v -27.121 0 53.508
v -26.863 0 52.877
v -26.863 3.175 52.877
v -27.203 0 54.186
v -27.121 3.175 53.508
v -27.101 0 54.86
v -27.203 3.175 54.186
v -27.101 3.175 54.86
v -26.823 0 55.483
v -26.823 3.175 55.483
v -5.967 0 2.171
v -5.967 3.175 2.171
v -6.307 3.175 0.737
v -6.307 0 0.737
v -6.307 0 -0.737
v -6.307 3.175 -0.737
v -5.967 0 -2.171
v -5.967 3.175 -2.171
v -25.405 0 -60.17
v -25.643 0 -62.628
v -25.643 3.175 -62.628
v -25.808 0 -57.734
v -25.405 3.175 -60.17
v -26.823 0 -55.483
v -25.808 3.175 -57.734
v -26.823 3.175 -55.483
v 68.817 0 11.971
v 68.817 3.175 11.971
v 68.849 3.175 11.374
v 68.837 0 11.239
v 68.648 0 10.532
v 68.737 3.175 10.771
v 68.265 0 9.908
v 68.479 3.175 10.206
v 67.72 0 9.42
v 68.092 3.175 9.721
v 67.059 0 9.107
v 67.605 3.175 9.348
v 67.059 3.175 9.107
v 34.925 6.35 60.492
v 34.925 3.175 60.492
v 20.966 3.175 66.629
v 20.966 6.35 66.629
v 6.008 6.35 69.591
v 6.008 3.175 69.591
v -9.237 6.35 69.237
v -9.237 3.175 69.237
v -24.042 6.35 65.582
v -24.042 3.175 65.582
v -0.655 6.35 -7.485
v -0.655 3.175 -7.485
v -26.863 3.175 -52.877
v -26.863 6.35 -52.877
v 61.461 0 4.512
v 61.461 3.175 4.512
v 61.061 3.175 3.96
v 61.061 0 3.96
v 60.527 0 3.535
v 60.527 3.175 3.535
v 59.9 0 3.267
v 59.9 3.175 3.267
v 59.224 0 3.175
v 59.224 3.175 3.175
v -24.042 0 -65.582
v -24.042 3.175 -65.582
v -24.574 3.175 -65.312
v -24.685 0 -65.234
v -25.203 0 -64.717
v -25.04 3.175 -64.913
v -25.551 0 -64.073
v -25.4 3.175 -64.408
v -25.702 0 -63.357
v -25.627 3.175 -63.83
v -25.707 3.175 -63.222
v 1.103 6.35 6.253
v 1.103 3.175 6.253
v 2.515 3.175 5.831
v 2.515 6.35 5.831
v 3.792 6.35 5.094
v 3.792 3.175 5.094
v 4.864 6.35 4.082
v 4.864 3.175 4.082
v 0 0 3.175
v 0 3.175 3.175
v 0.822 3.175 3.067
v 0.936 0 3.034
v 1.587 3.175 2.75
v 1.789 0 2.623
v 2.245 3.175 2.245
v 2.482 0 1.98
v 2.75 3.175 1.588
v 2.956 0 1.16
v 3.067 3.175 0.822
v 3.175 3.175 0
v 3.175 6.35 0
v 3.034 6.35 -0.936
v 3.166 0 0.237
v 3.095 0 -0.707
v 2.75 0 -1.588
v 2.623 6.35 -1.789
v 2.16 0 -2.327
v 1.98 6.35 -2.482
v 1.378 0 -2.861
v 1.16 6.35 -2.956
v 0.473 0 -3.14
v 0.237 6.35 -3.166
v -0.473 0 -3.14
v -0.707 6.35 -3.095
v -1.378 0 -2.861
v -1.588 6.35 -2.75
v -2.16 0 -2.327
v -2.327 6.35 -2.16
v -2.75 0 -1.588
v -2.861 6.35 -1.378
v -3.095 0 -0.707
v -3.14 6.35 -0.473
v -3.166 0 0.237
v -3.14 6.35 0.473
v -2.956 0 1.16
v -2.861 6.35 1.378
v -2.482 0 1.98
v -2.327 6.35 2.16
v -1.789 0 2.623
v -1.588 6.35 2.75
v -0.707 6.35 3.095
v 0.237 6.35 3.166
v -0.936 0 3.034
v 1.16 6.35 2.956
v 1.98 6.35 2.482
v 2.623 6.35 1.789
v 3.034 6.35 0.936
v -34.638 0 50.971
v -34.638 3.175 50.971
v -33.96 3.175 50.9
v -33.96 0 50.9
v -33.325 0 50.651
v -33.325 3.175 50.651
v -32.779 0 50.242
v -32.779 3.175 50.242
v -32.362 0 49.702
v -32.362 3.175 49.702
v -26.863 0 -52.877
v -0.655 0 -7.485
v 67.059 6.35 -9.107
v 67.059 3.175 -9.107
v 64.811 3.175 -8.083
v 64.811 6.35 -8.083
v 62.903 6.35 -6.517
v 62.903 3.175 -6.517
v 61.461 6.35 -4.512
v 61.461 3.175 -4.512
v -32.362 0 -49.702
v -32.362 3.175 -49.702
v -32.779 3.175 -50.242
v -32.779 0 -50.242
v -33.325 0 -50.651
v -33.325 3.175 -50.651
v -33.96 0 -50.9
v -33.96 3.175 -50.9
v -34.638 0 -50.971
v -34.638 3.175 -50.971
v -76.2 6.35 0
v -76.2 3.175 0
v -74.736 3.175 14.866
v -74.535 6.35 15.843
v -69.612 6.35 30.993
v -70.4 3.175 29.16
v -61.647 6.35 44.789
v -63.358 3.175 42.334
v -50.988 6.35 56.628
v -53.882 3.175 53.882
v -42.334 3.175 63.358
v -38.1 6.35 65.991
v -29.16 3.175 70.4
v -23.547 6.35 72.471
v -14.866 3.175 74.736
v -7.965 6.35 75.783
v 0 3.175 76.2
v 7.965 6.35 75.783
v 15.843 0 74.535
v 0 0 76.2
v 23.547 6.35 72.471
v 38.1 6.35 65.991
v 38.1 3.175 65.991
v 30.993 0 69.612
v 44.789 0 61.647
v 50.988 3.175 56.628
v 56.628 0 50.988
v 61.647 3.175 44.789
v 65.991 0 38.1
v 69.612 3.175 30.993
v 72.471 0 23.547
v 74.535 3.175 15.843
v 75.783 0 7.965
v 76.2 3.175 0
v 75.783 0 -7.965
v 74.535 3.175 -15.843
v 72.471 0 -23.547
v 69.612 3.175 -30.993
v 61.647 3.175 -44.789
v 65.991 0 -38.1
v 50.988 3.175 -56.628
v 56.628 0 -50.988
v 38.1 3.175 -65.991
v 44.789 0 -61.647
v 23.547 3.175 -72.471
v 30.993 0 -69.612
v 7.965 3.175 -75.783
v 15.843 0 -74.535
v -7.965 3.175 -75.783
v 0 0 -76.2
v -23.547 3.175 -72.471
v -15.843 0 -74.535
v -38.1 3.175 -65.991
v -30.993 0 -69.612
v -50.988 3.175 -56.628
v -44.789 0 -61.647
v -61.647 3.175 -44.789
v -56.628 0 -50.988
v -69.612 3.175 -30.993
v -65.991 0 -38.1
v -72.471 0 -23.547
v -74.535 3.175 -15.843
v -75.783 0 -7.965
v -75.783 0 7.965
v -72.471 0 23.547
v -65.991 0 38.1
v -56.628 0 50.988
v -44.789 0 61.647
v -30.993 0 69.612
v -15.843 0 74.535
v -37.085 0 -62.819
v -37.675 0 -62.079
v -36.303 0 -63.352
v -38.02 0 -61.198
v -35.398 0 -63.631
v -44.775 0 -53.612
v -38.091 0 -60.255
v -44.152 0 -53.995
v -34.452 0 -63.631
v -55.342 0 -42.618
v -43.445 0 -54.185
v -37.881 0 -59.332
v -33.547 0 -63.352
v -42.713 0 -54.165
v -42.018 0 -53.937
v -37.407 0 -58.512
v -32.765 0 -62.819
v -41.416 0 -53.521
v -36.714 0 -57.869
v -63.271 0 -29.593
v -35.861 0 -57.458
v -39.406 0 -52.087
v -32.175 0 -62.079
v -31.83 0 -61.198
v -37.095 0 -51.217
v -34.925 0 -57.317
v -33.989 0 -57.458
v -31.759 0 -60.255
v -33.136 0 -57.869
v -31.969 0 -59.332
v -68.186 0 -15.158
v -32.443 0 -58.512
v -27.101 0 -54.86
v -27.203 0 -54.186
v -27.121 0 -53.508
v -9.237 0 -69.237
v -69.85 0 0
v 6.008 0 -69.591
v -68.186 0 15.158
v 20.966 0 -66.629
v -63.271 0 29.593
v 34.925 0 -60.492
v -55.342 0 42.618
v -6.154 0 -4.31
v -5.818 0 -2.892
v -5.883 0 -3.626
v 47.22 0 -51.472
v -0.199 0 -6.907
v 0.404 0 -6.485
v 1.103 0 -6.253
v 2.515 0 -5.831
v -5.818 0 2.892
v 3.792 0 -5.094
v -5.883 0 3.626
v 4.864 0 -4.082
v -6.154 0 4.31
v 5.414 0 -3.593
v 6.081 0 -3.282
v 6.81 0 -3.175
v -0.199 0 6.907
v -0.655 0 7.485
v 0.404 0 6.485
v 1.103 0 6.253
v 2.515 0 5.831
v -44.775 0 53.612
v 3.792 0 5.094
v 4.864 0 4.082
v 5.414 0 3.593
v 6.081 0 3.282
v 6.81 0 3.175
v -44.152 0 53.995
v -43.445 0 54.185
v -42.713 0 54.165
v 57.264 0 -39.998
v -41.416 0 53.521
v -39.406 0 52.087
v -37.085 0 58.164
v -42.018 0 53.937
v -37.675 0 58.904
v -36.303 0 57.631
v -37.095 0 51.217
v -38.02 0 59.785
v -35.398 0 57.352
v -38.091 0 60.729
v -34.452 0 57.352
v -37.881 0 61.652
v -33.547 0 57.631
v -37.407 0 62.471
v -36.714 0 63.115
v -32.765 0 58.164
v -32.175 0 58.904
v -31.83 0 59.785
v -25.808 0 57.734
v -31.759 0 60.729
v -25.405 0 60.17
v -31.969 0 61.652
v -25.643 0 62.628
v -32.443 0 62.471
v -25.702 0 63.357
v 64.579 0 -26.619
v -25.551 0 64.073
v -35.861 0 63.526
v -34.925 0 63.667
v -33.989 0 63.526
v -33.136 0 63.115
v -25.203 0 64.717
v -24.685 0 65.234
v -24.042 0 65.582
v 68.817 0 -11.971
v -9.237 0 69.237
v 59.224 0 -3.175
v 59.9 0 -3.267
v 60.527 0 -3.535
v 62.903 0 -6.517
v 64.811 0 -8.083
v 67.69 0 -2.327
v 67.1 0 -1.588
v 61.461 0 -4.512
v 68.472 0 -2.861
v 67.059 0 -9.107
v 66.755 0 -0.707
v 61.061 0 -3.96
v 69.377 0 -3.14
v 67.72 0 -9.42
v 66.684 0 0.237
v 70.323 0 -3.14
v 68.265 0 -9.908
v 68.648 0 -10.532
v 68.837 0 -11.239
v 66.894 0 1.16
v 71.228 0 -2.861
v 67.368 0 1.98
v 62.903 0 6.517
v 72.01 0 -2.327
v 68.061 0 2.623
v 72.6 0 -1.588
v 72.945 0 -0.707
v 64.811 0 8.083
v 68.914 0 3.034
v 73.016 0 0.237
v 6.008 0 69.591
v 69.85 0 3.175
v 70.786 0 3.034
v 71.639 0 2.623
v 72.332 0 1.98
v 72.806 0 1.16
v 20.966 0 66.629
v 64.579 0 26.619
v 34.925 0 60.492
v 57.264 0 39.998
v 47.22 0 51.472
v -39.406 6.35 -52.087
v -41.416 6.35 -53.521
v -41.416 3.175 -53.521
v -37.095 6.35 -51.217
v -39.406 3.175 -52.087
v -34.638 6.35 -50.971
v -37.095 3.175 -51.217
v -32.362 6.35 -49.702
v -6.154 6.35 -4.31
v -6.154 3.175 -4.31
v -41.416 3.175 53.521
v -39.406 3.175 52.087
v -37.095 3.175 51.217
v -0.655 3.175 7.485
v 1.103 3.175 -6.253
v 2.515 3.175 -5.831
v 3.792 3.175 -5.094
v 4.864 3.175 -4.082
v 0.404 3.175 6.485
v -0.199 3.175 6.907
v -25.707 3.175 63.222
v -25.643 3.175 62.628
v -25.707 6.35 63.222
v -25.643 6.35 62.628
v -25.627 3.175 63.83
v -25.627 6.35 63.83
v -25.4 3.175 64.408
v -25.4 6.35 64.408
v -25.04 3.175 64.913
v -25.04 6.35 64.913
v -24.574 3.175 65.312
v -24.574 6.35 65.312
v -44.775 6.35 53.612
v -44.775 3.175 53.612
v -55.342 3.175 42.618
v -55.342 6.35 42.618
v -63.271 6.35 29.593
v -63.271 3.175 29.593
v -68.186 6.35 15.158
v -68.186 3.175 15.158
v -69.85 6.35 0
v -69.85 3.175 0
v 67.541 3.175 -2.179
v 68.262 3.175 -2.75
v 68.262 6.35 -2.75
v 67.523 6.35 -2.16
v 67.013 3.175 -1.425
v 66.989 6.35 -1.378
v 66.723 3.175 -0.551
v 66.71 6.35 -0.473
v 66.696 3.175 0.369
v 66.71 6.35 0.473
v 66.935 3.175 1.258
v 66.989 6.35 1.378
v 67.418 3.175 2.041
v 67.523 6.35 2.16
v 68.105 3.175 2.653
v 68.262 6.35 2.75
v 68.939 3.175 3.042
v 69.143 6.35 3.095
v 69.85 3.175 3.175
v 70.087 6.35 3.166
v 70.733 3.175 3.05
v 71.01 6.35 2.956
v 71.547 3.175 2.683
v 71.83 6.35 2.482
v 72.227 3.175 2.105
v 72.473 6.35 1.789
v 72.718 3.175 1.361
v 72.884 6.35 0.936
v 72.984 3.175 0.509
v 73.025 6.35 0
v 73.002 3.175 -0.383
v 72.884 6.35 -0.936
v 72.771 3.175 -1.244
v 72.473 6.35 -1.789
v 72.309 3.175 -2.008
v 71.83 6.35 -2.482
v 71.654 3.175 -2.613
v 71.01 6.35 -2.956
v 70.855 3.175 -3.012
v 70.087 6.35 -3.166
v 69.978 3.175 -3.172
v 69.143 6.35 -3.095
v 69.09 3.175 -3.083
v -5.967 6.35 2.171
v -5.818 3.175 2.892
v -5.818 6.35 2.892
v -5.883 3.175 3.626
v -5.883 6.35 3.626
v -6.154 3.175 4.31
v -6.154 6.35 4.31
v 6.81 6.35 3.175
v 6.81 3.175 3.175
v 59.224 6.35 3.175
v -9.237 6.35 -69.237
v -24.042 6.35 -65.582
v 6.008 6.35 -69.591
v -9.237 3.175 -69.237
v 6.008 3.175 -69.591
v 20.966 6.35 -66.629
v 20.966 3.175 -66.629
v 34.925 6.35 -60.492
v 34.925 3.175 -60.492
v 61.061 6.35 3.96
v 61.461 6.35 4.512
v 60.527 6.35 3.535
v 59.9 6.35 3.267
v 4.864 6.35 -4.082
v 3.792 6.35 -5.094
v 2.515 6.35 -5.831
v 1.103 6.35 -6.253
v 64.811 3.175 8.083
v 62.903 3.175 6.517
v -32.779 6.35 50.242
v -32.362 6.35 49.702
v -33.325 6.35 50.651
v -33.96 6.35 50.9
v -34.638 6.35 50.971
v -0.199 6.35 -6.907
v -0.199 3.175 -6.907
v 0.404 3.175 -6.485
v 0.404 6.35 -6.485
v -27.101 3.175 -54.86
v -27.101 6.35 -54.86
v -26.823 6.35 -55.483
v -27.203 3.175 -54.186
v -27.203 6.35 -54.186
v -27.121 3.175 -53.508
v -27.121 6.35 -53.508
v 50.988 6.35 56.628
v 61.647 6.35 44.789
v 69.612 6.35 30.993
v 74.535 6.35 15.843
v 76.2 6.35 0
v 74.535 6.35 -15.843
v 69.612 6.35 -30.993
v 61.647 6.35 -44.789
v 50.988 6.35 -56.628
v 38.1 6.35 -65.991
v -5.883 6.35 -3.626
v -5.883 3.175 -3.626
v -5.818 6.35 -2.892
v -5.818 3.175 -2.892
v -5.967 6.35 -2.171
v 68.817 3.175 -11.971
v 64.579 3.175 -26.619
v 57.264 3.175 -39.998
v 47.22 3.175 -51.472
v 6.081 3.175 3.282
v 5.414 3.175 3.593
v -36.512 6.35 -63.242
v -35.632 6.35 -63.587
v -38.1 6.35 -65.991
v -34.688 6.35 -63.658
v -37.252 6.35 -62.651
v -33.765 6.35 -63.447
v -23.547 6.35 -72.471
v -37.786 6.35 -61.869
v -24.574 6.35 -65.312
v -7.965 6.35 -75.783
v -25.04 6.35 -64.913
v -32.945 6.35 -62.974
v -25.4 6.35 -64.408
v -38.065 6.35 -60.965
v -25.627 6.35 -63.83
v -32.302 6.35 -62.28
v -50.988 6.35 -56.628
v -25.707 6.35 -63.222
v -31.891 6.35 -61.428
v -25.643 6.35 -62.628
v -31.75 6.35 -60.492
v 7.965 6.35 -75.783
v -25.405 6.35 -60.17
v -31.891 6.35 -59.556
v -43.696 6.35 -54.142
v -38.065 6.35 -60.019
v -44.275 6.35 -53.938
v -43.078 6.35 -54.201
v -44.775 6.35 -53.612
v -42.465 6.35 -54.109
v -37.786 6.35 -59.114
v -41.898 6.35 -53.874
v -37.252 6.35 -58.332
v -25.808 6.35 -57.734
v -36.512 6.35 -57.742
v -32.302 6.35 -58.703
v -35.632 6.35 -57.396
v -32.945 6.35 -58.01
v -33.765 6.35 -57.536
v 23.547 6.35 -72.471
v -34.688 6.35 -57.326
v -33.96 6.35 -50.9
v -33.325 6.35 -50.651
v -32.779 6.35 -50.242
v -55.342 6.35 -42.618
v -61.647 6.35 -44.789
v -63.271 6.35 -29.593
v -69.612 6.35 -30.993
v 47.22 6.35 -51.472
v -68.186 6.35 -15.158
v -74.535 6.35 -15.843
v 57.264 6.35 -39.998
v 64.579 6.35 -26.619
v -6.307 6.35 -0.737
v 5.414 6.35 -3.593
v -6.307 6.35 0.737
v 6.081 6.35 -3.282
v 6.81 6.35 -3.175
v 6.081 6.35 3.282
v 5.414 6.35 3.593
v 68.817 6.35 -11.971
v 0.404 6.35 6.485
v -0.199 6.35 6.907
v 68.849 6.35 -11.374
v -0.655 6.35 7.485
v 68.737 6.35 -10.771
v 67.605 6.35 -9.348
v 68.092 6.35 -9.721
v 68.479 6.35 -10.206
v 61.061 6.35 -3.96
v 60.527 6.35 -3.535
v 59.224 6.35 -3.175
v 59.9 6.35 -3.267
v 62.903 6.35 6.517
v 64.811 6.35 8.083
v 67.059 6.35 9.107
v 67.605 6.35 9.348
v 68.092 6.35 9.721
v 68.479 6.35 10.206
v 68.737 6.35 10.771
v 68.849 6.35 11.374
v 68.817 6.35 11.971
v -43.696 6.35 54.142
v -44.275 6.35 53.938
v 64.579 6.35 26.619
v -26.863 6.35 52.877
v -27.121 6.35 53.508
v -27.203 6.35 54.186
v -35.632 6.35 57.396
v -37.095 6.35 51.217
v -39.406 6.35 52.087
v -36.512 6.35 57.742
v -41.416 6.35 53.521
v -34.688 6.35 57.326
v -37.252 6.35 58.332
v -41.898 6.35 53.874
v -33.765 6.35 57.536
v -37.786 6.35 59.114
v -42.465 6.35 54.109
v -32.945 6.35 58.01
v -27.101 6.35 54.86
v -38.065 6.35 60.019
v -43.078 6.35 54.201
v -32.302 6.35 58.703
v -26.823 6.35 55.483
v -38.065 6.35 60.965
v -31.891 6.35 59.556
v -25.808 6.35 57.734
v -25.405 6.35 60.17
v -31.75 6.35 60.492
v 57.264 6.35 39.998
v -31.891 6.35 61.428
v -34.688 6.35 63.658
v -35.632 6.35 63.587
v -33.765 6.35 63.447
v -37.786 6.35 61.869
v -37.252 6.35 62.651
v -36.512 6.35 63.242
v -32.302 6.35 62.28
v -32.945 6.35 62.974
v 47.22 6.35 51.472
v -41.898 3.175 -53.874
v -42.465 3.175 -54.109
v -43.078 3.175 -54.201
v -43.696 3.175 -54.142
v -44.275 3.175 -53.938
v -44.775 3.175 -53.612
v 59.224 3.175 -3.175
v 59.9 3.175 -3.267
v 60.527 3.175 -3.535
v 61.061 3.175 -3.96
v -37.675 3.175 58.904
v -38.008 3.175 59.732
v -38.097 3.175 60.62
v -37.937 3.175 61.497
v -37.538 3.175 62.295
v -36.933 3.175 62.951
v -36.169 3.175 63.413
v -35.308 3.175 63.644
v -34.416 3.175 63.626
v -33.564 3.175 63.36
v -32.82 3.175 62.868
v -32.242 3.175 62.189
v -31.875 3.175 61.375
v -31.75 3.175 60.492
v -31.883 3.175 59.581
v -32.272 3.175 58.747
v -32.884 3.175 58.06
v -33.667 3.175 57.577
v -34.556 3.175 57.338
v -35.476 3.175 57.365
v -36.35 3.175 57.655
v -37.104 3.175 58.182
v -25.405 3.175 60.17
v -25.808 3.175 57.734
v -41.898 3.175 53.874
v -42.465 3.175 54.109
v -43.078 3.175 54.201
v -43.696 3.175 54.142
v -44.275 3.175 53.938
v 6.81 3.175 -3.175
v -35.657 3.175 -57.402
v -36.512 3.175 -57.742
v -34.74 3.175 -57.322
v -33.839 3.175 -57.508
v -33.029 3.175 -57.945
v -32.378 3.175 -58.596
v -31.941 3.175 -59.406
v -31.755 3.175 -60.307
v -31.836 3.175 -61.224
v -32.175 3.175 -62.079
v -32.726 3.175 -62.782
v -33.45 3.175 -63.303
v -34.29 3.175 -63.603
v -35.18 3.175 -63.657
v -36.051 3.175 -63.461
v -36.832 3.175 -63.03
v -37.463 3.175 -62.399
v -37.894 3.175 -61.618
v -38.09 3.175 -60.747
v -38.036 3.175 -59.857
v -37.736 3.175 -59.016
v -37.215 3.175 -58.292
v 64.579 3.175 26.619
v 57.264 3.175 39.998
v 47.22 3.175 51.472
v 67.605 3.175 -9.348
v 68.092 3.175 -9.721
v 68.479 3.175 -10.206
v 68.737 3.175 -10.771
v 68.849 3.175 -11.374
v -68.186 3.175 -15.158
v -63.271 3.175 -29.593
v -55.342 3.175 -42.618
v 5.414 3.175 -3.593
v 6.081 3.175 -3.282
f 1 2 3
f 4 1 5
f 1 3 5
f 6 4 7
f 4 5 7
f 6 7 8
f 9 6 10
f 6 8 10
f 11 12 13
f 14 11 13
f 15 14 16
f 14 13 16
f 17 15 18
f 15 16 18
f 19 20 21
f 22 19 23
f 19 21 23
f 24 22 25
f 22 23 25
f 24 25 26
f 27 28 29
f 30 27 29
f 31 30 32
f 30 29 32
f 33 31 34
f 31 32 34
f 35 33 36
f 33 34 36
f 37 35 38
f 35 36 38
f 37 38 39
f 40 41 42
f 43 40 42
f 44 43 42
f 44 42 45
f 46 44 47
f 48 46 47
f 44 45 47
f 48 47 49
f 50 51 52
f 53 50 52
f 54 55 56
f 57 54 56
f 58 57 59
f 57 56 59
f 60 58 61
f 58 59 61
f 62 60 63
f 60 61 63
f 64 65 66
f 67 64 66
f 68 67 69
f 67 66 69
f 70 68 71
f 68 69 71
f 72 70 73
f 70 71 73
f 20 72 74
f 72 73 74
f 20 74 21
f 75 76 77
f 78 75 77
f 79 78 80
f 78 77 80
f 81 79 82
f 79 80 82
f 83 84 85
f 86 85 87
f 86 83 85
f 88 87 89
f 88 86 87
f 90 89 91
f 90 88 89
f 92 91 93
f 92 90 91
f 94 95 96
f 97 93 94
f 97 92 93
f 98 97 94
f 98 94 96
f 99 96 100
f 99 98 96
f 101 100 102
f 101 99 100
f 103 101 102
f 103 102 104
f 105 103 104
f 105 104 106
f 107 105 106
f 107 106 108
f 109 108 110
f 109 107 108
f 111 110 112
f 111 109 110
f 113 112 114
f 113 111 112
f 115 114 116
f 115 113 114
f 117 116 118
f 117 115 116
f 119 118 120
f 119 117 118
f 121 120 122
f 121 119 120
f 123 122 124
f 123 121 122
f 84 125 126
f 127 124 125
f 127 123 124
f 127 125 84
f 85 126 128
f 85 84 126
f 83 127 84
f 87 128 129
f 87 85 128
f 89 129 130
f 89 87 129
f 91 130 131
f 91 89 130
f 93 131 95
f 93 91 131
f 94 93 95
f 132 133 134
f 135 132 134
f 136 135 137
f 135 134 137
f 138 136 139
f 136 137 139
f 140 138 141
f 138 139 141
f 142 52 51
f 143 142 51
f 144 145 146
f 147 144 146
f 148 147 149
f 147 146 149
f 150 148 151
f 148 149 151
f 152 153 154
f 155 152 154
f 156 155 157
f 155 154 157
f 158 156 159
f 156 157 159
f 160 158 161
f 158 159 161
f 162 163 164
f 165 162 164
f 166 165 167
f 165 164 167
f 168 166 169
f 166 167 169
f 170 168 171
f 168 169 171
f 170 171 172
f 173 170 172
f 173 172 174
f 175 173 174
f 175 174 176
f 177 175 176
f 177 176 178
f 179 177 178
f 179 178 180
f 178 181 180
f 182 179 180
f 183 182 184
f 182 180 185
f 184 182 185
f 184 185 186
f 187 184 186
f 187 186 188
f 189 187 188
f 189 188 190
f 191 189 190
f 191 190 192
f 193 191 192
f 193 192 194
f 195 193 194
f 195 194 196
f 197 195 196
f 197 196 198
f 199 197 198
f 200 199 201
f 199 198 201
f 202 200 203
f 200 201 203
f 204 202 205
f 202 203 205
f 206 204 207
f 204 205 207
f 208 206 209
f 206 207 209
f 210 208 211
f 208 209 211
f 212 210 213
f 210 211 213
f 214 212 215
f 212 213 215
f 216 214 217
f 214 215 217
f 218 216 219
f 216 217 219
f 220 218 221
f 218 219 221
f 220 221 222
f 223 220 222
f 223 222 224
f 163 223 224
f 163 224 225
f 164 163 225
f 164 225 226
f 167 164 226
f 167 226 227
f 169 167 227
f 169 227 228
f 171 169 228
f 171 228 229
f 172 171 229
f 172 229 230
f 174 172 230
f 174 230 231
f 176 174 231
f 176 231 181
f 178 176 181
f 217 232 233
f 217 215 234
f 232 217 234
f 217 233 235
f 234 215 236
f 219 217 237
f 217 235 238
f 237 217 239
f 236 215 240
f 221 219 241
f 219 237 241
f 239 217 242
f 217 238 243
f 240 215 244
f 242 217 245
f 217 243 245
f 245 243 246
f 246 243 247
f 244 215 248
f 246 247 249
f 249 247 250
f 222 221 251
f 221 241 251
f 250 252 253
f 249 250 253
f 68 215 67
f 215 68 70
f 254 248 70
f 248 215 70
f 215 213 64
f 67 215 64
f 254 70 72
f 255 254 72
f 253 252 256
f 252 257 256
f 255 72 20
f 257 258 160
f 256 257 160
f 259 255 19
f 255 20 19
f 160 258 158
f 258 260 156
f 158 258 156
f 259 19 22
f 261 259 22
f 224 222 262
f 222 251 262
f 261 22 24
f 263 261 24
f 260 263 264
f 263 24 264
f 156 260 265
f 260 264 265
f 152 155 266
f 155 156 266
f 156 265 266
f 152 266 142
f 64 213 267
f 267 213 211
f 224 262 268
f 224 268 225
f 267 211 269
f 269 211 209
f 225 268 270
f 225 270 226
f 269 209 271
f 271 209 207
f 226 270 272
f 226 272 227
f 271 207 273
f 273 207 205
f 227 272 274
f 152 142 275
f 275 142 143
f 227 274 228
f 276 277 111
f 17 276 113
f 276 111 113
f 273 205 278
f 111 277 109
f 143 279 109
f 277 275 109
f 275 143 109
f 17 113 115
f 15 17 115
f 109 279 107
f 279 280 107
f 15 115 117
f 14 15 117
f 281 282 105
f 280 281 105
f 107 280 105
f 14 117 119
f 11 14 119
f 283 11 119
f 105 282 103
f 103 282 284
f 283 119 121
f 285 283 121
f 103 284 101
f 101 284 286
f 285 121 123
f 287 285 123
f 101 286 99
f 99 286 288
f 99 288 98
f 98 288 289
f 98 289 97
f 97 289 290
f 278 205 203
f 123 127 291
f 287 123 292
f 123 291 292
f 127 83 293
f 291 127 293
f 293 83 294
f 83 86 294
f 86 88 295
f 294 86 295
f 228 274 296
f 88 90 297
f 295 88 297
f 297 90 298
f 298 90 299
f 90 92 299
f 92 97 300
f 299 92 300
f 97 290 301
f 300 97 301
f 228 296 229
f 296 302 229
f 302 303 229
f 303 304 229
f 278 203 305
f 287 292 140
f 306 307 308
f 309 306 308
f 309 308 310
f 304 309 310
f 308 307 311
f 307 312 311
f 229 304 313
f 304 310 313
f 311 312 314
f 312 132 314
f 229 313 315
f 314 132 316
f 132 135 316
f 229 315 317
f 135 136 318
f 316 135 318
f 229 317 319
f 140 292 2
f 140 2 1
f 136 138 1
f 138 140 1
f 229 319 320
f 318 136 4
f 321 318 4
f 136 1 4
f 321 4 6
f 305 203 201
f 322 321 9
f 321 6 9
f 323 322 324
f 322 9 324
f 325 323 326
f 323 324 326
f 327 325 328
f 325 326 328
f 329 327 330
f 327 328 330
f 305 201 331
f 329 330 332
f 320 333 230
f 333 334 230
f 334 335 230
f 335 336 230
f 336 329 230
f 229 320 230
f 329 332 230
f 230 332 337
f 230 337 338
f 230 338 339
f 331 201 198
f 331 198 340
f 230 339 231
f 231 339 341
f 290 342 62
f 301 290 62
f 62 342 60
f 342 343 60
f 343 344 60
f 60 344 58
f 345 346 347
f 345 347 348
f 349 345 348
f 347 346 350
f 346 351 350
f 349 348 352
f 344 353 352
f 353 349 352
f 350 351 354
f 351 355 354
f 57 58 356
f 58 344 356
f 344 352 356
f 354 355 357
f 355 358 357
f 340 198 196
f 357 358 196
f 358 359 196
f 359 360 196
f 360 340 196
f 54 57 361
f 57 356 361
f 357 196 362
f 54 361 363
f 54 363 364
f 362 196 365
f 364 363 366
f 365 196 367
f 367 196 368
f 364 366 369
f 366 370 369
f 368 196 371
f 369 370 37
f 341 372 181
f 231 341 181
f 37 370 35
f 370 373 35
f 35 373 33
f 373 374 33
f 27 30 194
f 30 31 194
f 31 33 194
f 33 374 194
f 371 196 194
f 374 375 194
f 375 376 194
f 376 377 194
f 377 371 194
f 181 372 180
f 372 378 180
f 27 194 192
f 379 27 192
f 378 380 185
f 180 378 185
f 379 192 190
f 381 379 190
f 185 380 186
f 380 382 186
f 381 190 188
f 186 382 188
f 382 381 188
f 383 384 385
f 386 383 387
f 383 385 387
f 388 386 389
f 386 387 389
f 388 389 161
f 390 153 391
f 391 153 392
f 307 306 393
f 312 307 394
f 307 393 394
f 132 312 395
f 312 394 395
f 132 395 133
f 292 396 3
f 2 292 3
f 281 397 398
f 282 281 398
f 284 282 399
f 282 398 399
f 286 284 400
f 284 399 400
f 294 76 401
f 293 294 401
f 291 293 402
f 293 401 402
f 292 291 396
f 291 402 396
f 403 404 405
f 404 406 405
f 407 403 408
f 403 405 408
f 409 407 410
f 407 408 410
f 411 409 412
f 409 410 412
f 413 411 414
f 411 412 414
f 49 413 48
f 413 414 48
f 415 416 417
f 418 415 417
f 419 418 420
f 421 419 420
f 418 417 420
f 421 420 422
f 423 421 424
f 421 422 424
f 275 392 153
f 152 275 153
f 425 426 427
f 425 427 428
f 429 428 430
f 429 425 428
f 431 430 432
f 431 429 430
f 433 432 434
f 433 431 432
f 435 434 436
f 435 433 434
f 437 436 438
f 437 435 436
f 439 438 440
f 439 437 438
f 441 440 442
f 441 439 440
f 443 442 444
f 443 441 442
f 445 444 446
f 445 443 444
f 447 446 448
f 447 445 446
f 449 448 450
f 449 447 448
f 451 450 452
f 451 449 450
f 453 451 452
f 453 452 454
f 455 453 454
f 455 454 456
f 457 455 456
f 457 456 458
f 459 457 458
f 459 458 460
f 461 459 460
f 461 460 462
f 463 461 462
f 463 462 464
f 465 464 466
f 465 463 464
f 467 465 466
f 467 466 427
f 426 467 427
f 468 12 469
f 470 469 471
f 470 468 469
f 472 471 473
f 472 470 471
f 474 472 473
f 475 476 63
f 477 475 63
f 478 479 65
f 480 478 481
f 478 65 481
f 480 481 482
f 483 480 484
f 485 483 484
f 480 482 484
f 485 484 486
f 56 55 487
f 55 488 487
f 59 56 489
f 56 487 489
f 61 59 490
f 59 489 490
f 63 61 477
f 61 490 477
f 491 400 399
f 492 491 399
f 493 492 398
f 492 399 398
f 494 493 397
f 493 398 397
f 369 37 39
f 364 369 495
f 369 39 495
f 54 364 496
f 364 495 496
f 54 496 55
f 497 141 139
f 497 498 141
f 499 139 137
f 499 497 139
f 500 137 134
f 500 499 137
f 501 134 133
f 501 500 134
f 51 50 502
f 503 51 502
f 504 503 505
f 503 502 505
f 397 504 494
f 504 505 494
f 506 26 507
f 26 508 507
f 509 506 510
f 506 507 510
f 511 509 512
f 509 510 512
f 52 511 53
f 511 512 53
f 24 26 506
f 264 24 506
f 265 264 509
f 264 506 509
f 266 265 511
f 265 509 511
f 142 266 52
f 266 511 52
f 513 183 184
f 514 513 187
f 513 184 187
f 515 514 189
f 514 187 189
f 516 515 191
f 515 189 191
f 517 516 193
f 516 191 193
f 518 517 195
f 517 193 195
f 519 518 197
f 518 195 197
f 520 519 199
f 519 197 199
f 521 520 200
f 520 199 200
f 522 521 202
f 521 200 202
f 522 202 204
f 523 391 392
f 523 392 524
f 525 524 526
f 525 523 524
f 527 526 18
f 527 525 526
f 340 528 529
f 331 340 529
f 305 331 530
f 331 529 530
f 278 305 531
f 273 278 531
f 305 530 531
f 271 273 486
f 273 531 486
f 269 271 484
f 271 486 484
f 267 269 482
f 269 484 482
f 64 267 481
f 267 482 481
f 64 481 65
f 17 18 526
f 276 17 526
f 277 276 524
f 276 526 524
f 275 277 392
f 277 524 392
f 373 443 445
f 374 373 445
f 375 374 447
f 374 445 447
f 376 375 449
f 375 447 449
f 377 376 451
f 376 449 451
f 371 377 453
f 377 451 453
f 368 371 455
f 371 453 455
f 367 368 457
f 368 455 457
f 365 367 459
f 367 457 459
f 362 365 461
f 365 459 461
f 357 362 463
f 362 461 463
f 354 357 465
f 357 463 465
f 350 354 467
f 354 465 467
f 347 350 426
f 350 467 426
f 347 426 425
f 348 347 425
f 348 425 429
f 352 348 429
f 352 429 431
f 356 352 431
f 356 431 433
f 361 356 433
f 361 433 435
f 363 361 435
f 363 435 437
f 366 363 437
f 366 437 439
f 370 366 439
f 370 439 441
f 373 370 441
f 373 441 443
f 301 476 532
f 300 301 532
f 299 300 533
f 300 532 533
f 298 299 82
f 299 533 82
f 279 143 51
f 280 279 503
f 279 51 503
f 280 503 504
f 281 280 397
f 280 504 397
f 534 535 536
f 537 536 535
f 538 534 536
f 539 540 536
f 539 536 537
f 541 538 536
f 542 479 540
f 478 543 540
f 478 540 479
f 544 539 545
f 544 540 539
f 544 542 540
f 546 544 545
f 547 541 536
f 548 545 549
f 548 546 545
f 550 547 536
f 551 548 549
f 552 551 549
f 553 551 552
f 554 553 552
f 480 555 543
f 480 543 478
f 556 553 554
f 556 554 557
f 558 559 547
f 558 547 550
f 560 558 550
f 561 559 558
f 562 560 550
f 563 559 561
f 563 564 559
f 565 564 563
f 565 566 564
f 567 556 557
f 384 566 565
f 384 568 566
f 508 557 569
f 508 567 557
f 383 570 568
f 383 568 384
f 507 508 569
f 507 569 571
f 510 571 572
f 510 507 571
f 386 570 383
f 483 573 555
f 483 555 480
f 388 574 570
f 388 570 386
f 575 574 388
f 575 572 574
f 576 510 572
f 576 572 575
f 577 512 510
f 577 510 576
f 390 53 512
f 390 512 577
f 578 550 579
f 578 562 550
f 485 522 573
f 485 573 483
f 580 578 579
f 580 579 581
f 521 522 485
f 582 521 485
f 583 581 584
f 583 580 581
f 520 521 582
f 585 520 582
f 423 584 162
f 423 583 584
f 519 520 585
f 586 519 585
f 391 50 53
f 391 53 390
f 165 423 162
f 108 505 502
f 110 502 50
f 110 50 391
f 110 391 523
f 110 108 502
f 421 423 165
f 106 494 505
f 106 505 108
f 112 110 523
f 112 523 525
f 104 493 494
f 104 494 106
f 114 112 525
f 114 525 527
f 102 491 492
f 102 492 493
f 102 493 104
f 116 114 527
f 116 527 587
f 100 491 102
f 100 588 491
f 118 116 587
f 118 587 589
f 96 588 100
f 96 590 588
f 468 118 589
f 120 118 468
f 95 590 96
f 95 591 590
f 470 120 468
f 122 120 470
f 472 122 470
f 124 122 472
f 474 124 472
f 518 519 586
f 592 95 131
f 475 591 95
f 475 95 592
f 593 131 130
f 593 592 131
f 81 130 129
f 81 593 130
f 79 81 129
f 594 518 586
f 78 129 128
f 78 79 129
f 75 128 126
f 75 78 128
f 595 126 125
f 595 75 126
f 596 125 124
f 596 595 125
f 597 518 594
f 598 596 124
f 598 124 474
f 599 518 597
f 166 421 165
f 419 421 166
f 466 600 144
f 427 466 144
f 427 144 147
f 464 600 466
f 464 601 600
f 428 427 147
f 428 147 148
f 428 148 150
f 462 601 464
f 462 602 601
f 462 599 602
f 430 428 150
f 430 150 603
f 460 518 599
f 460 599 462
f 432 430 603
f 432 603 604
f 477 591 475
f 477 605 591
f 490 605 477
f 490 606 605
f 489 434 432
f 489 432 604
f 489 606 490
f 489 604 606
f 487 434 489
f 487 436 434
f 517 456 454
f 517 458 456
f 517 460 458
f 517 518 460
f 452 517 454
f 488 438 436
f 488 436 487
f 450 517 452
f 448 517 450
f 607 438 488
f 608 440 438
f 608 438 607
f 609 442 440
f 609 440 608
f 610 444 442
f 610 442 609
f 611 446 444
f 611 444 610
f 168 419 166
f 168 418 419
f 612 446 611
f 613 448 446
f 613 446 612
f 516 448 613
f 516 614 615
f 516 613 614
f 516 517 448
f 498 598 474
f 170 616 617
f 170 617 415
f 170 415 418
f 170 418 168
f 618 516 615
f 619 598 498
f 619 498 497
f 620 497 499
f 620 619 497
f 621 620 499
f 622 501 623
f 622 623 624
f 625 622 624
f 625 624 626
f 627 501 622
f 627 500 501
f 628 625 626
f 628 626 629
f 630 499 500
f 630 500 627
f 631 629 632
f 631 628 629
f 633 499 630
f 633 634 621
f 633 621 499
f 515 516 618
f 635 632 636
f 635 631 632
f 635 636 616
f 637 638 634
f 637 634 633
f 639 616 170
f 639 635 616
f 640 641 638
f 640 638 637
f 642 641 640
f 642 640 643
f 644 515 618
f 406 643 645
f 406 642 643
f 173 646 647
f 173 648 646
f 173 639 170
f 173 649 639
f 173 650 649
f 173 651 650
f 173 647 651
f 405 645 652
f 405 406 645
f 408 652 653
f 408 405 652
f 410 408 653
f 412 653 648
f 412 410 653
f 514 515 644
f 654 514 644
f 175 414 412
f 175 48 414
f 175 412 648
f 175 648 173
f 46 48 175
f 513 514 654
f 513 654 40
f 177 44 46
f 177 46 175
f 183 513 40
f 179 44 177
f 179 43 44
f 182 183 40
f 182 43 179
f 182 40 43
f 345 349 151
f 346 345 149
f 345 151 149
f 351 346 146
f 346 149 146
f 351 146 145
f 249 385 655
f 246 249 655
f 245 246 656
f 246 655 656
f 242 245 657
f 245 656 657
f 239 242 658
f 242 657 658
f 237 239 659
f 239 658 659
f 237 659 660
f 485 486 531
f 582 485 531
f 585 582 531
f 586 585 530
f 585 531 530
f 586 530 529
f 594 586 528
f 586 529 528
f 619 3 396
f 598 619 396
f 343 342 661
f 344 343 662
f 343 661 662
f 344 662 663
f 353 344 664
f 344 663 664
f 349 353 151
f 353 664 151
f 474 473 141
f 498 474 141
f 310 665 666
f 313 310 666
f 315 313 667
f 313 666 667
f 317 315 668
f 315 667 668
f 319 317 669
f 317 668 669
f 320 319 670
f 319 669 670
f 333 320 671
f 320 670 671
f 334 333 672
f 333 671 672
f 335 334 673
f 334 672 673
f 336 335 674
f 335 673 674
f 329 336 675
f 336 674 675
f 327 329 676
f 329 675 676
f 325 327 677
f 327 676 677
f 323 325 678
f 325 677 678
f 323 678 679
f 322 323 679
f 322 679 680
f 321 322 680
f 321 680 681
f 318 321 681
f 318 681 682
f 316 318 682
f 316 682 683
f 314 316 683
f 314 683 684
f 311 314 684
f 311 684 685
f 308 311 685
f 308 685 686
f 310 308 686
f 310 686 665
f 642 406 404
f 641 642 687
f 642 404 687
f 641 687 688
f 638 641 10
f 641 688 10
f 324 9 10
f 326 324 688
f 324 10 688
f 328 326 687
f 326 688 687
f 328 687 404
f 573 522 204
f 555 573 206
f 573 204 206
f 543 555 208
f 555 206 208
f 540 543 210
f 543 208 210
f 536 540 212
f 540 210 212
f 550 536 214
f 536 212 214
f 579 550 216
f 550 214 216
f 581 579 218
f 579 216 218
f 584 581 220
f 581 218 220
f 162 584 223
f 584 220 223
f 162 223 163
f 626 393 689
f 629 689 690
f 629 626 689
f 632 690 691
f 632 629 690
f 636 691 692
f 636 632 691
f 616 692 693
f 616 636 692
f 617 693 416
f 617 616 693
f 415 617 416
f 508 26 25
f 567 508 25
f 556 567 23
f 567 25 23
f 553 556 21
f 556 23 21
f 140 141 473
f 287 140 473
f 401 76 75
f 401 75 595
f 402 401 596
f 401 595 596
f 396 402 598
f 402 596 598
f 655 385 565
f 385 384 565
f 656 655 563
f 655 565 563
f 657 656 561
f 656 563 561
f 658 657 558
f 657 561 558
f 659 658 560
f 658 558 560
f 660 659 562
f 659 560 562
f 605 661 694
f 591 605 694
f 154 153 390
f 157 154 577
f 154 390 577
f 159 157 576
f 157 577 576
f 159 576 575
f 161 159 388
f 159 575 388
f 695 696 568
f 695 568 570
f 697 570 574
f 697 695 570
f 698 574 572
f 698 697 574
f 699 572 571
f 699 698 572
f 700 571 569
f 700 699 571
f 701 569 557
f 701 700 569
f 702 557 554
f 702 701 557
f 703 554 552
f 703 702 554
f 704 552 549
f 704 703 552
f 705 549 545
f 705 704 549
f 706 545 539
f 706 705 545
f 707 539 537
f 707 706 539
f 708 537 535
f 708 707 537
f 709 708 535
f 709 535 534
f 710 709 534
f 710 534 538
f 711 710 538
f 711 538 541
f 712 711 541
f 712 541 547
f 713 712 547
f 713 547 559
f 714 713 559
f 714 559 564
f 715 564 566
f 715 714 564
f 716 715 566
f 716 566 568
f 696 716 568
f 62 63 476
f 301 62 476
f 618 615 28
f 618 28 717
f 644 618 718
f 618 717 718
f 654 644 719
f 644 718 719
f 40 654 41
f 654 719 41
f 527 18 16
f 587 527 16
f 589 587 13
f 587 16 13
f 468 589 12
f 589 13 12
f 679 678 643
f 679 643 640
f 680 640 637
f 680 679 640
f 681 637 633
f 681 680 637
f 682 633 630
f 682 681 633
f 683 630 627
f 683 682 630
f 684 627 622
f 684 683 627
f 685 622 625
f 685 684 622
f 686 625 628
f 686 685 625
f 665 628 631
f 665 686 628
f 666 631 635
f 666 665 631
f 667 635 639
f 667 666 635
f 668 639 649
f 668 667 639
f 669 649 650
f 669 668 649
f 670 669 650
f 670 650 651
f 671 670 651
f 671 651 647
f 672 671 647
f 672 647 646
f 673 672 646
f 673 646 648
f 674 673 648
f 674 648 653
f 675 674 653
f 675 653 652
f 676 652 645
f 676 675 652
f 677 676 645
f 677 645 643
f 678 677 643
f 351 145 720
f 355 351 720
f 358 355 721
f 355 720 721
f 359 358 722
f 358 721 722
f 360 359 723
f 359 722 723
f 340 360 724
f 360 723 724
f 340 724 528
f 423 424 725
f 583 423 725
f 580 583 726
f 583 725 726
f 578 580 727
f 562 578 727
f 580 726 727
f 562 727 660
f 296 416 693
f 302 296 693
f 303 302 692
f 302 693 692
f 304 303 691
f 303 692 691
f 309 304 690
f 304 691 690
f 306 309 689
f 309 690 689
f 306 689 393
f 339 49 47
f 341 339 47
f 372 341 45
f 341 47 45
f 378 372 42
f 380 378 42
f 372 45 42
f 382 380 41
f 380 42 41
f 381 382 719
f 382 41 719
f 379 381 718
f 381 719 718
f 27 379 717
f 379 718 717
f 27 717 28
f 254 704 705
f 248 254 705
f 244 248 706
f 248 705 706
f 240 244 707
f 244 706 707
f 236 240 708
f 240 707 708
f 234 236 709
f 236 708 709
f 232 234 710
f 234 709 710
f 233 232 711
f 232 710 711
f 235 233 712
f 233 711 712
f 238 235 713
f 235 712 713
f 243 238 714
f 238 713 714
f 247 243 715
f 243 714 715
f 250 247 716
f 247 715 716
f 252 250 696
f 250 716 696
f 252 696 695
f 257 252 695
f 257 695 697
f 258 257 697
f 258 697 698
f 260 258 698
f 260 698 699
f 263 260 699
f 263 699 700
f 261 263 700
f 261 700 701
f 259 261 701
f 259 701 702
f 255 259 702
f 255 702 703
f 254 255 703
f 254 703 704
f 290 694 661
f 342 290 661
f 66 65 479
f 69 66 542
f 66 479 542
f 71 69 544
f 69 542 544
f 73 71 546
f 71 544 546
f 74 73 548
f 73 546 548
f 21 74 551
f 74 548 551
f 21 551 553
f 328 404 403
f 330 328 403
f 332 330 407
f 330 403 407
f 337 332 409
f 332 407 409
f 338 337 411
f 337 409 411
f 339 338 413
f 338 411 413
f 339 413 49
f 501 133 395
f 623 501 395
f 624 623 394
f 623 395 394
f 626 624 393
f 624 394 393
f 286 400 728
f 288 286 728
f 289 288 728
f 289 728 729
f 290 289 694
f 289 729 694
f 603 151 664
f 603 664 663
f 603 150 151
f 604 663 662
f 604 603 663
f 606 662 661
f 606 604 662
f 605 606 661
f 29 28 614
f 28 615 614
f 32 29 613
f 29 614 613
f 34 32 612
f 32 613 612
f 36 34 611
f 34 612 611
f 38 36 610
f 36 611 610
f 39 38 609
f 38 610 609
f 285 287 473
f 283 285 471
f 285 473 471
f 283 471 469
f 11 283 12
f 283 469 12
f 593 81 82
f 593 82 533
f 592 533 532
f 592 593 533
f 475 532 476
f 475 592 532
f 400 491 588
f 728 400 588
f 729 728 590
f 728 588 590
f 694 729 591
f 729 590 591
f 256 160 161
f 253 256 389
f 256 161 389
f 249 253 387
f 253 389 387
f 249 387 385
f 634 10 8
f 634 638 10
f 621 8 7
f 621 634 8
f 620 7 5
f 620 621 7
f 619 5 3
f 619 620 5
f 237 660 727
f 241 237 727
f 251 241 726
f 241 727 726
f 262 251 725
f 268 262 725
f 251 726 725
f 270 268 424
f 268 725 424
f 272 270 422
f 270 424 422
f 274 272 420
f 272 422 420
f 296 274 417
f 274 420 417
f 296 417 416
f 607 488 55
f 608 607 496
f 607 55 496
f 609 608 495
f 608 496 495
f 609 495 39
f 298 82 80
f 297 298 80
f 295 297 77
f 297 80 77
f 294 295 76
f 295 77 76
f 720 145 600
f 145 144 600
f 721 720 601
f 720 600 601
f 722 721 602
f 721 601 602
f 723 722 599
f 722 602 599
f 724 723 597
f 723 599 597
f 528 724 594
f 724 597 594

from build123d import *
from build123d.topology import SkipClean

# Parameters (mm, degrees)
SKETCH1_R           = 76.2
SKETCH1_R_2         = 3.175
BOSS_EXTRUDE1_DEPTH = 3.175
SKETCH2_R           = 3.175
CUT_EXTRUDE1_DEPTH  = 108.809835474
CIRPATTERN1_COUNT   = 3
SKETCH3_R           = 3.175
BOSS_EXTRUDE2_DEPTH = 3.175
CIRPATTERN2_COUNT   = 3
FILLET1_R           = 2.54
CUT_EXTRUDE2_DEPTH  = 108.809835619
CIRPATTERN3_COUNT   = 3


with BuildPart() as part:
    # Sketch1 → Boss-Extrude1 (new body)
    with BuildSketch(Plane(origin=(0, 0, 0), x_dir=(1, 0, 0), z_dir=(0, 1, 0))):
        with Locations(Location((0, 0, 0), (0, 0, 270))):
            Circle(SKETCH1_R)
        with Locations(Location((0, 0, 0), (0, 0, 270))):
            Circle(SKETCH1_R_2, mode=Mode.SUBTRACT)
    extrude(amount=BOSS_EXTRUDE1_DEPTH)

    # Sketch2 → Cut-Extrude1 (cut, through all)
    with BuildSketch(Plane(origin=(0, 3.175, 0), x_dir=(1, 0, 0), z_dir=(0, 1, 0))):
        with Locations(Location((69.85, 0, 0), (0, 0, 270))):
            Circle(SKETCH2_R)
    cut_extrude1 = extrude(amount=-CUT_EXTRUDE1_DEPTH, mode=Mode.SUBTRACT)

    # CirPattern1: Cut-Extrude1 ×3 about axis
    cirpattern1_axis = Axis((0, 0, 0), (0, 1, 0))
    for i in range(1, CIRPATTERN1_COUNT):
        add(cut_extrude1.rotate(cirpattern1_axis, i * 360 / CIRPATTERN1_COUNT), mode=Mode.SUBTRACT)

    # Sketch3 → Boss-Extrude2 (add)
    with BuildSketch(Plane(origin=(0, 3.175, 0), x_dir=(1, 0, 0), z_dir=(0, 1, 0))):
        with BuildLine():
            Line((-27.685241282, -54.302244521), (0, -6.35))
            ThreePointArc((0, -6.35), (3.175, 5.499261314), (-5.499261314, -3.175))
            Line((-5.499261314, -3.175), (-33.184502596, -51.127244521))
            ThreePointArc((-33.184502596, -51.127244521), (-38.613147674, -51.709893372), (-42.829980166, -55.178032758))
            ThreePointArc((-42.829980166, -55.178032758), (-62.732354549, -30.719280472), (-69.85, 0))
            Line((-69.85, 0), (-76.2, 0))
            ThreePointArc((-76.2, 0), (-38.1, -65.991135768), (38.1, -65.991135768))
            Line((38.1, -65.991135768), (34.925, -60.491874454))
            ThreePointArc((34.925, -60.491874454), (4.7625, -69.687452915), (-26.370588016, -64.680867246))
            ThreePointArc((-26.370588016, -64.680867246), (-25.47550745, -59.294913492), (-27.685241282, -54.302244521))
        make_face()
        with Locations((-34.925, -60.491874454)):
            Circle(SKETCH3_R, mode=Mode.SUBTRACT)
        Circle(SKETCH3_R, mode=Mode.SUBTRACT)
    boss_extrude2 = extrude(amount=BOSS_EXTRUDE2_DEPTH)

    # CirPattern2: Boss-Extrude2 ×3 about axis
    with SkipClean():  # the faces are left unmerged after this step: merging them gives an invalid solid
        cirpattern2_axis = Axis((0, 0, 0), (0, 1, 0))
        for i in range(1, CIRPATTERN2_COUNT):
            add(boss_extrude2.rotate(cirpattern2_axis, i * 360 / CIRPATTERN2_COUNT))

    # Fillet1
    fillet1_edges = [part.edges().sort_by_distance(p)[0] for p in [
        (0, 4.7625, 6.35),
        (-5.499261314, 4.7625, 3.175),
        (-33.184502596, 4.7625, 51.127244521),
        (-42.829980166, 4.7625, 55.178032758),
        (-26.370588016, 4.7625, 64.680867246),
        (-27.685241282, 4.7625, 54.302244521),
        (-5.499261314, 4.7625, -3.175),
        (5.499261314, 4.7625, -3.175),
        (5.499261314, 4.7625, 3.175),
        (60.869743879, 4.7625, 3.175),
        (69.200568182, 4.7625, 9.502834488),
        (-26.370588016, 4.7625, -64.680867246),
        (69.200568182, 4.7625, -9.502834488),
        (60.869743879, 4.7625, -3.175),
        (0, 4.7625, -6.35),
        (-27.685241282, 4.7625, -54.302244521),
        (-42.829980166, 4.7625, -55.178032758),
        (-33.184502596, 4.7625, -51.127244521),
    ]]
    fillet(fillet1_edges, radius=FILLET1_R)

    # Sketch4 → Cut-Extrude2 (cut, through all)
    with SkipClean():  # the faces are left unmerged after this step: merging them gives an invalid solid
        with BuildSketch(Plane(origin=(0, 3.175, 0), x_dir=(1, 0, 0), z_dir=(0, 1, 0))):
            with BuildLine():
                Line((-6.154438838, 4.30980076), (-32.361839489, 49.702350221))
                ThreePointArc((-32.361839489, 49.702350221), (-33.324824736, 50.650936578), (-34.638061064, 50.971197428))
                ThreePointArc((-34.638061064, 50.971197428), (-38.278807741, 51.576853499), (-41.416002253, 53.521041308))
                ThreePointArc((-41.416002253, 53.521041308), (-43.078433965, 54.20122857), (-44.775122458, 53.611667656))
                ThreePointArc((-44.775122458, 53.611667656), (-69.85, 0), (-44.775122458, -53.611667656))
                ThreePointArc((-44.775122458, -53.611667656), (-43.078433965, -54.20122857), (-41.416002253, -53.521041308))
                ThreePointArc((-41.416002253, -53.521041308), (-38.278807741, -51.576853499), (-34.638061064, -50.971197428))
                ThreePointArc((-34.638061064, -50.971197428), (-33.324824736, -50.650936578), (-32.361839489, -49.702350221))
                Line((-32.361839489, -49.702350221), (-6.154438838, -4.30980076))
                ThreePointArc((-6.154438838, -4.30980076), (-5.823818881, -3.261291188), (-5.96724526, -2.171286257))
                ThreePointArc((-5.96724526, -2.171286257), (-6.35, 0), (-5.96724526, 2.171286257))
                ThreePointArc((-5.96724526, 2.171286257), (-5.823818881, 3.261291188), (-6.154438838, 4.30980076))
            make_face()
        cut_extrude2 = extrude(amount=-CUT_EXTRUDE2_DEPTH, mode=Mode.SUBTRACT)

    # CirPattern3: Cut-Extrude2 ×3 about axis
    with SkipClean():  # the faces are left unmerged after this step: merging them gives an invalid solid
        cirpattern3_axis = Axis((0, 3.175, 0), (0, -1, 0))
        for i in range(1, CIRPATTERN3_COUNT):
            add(cut_extrude2.rotate(cirpattern3_axis, i * 360 / CIRPATTERN3_COUNT), mode=Mode.SUBTRACT)


solid = part.part
